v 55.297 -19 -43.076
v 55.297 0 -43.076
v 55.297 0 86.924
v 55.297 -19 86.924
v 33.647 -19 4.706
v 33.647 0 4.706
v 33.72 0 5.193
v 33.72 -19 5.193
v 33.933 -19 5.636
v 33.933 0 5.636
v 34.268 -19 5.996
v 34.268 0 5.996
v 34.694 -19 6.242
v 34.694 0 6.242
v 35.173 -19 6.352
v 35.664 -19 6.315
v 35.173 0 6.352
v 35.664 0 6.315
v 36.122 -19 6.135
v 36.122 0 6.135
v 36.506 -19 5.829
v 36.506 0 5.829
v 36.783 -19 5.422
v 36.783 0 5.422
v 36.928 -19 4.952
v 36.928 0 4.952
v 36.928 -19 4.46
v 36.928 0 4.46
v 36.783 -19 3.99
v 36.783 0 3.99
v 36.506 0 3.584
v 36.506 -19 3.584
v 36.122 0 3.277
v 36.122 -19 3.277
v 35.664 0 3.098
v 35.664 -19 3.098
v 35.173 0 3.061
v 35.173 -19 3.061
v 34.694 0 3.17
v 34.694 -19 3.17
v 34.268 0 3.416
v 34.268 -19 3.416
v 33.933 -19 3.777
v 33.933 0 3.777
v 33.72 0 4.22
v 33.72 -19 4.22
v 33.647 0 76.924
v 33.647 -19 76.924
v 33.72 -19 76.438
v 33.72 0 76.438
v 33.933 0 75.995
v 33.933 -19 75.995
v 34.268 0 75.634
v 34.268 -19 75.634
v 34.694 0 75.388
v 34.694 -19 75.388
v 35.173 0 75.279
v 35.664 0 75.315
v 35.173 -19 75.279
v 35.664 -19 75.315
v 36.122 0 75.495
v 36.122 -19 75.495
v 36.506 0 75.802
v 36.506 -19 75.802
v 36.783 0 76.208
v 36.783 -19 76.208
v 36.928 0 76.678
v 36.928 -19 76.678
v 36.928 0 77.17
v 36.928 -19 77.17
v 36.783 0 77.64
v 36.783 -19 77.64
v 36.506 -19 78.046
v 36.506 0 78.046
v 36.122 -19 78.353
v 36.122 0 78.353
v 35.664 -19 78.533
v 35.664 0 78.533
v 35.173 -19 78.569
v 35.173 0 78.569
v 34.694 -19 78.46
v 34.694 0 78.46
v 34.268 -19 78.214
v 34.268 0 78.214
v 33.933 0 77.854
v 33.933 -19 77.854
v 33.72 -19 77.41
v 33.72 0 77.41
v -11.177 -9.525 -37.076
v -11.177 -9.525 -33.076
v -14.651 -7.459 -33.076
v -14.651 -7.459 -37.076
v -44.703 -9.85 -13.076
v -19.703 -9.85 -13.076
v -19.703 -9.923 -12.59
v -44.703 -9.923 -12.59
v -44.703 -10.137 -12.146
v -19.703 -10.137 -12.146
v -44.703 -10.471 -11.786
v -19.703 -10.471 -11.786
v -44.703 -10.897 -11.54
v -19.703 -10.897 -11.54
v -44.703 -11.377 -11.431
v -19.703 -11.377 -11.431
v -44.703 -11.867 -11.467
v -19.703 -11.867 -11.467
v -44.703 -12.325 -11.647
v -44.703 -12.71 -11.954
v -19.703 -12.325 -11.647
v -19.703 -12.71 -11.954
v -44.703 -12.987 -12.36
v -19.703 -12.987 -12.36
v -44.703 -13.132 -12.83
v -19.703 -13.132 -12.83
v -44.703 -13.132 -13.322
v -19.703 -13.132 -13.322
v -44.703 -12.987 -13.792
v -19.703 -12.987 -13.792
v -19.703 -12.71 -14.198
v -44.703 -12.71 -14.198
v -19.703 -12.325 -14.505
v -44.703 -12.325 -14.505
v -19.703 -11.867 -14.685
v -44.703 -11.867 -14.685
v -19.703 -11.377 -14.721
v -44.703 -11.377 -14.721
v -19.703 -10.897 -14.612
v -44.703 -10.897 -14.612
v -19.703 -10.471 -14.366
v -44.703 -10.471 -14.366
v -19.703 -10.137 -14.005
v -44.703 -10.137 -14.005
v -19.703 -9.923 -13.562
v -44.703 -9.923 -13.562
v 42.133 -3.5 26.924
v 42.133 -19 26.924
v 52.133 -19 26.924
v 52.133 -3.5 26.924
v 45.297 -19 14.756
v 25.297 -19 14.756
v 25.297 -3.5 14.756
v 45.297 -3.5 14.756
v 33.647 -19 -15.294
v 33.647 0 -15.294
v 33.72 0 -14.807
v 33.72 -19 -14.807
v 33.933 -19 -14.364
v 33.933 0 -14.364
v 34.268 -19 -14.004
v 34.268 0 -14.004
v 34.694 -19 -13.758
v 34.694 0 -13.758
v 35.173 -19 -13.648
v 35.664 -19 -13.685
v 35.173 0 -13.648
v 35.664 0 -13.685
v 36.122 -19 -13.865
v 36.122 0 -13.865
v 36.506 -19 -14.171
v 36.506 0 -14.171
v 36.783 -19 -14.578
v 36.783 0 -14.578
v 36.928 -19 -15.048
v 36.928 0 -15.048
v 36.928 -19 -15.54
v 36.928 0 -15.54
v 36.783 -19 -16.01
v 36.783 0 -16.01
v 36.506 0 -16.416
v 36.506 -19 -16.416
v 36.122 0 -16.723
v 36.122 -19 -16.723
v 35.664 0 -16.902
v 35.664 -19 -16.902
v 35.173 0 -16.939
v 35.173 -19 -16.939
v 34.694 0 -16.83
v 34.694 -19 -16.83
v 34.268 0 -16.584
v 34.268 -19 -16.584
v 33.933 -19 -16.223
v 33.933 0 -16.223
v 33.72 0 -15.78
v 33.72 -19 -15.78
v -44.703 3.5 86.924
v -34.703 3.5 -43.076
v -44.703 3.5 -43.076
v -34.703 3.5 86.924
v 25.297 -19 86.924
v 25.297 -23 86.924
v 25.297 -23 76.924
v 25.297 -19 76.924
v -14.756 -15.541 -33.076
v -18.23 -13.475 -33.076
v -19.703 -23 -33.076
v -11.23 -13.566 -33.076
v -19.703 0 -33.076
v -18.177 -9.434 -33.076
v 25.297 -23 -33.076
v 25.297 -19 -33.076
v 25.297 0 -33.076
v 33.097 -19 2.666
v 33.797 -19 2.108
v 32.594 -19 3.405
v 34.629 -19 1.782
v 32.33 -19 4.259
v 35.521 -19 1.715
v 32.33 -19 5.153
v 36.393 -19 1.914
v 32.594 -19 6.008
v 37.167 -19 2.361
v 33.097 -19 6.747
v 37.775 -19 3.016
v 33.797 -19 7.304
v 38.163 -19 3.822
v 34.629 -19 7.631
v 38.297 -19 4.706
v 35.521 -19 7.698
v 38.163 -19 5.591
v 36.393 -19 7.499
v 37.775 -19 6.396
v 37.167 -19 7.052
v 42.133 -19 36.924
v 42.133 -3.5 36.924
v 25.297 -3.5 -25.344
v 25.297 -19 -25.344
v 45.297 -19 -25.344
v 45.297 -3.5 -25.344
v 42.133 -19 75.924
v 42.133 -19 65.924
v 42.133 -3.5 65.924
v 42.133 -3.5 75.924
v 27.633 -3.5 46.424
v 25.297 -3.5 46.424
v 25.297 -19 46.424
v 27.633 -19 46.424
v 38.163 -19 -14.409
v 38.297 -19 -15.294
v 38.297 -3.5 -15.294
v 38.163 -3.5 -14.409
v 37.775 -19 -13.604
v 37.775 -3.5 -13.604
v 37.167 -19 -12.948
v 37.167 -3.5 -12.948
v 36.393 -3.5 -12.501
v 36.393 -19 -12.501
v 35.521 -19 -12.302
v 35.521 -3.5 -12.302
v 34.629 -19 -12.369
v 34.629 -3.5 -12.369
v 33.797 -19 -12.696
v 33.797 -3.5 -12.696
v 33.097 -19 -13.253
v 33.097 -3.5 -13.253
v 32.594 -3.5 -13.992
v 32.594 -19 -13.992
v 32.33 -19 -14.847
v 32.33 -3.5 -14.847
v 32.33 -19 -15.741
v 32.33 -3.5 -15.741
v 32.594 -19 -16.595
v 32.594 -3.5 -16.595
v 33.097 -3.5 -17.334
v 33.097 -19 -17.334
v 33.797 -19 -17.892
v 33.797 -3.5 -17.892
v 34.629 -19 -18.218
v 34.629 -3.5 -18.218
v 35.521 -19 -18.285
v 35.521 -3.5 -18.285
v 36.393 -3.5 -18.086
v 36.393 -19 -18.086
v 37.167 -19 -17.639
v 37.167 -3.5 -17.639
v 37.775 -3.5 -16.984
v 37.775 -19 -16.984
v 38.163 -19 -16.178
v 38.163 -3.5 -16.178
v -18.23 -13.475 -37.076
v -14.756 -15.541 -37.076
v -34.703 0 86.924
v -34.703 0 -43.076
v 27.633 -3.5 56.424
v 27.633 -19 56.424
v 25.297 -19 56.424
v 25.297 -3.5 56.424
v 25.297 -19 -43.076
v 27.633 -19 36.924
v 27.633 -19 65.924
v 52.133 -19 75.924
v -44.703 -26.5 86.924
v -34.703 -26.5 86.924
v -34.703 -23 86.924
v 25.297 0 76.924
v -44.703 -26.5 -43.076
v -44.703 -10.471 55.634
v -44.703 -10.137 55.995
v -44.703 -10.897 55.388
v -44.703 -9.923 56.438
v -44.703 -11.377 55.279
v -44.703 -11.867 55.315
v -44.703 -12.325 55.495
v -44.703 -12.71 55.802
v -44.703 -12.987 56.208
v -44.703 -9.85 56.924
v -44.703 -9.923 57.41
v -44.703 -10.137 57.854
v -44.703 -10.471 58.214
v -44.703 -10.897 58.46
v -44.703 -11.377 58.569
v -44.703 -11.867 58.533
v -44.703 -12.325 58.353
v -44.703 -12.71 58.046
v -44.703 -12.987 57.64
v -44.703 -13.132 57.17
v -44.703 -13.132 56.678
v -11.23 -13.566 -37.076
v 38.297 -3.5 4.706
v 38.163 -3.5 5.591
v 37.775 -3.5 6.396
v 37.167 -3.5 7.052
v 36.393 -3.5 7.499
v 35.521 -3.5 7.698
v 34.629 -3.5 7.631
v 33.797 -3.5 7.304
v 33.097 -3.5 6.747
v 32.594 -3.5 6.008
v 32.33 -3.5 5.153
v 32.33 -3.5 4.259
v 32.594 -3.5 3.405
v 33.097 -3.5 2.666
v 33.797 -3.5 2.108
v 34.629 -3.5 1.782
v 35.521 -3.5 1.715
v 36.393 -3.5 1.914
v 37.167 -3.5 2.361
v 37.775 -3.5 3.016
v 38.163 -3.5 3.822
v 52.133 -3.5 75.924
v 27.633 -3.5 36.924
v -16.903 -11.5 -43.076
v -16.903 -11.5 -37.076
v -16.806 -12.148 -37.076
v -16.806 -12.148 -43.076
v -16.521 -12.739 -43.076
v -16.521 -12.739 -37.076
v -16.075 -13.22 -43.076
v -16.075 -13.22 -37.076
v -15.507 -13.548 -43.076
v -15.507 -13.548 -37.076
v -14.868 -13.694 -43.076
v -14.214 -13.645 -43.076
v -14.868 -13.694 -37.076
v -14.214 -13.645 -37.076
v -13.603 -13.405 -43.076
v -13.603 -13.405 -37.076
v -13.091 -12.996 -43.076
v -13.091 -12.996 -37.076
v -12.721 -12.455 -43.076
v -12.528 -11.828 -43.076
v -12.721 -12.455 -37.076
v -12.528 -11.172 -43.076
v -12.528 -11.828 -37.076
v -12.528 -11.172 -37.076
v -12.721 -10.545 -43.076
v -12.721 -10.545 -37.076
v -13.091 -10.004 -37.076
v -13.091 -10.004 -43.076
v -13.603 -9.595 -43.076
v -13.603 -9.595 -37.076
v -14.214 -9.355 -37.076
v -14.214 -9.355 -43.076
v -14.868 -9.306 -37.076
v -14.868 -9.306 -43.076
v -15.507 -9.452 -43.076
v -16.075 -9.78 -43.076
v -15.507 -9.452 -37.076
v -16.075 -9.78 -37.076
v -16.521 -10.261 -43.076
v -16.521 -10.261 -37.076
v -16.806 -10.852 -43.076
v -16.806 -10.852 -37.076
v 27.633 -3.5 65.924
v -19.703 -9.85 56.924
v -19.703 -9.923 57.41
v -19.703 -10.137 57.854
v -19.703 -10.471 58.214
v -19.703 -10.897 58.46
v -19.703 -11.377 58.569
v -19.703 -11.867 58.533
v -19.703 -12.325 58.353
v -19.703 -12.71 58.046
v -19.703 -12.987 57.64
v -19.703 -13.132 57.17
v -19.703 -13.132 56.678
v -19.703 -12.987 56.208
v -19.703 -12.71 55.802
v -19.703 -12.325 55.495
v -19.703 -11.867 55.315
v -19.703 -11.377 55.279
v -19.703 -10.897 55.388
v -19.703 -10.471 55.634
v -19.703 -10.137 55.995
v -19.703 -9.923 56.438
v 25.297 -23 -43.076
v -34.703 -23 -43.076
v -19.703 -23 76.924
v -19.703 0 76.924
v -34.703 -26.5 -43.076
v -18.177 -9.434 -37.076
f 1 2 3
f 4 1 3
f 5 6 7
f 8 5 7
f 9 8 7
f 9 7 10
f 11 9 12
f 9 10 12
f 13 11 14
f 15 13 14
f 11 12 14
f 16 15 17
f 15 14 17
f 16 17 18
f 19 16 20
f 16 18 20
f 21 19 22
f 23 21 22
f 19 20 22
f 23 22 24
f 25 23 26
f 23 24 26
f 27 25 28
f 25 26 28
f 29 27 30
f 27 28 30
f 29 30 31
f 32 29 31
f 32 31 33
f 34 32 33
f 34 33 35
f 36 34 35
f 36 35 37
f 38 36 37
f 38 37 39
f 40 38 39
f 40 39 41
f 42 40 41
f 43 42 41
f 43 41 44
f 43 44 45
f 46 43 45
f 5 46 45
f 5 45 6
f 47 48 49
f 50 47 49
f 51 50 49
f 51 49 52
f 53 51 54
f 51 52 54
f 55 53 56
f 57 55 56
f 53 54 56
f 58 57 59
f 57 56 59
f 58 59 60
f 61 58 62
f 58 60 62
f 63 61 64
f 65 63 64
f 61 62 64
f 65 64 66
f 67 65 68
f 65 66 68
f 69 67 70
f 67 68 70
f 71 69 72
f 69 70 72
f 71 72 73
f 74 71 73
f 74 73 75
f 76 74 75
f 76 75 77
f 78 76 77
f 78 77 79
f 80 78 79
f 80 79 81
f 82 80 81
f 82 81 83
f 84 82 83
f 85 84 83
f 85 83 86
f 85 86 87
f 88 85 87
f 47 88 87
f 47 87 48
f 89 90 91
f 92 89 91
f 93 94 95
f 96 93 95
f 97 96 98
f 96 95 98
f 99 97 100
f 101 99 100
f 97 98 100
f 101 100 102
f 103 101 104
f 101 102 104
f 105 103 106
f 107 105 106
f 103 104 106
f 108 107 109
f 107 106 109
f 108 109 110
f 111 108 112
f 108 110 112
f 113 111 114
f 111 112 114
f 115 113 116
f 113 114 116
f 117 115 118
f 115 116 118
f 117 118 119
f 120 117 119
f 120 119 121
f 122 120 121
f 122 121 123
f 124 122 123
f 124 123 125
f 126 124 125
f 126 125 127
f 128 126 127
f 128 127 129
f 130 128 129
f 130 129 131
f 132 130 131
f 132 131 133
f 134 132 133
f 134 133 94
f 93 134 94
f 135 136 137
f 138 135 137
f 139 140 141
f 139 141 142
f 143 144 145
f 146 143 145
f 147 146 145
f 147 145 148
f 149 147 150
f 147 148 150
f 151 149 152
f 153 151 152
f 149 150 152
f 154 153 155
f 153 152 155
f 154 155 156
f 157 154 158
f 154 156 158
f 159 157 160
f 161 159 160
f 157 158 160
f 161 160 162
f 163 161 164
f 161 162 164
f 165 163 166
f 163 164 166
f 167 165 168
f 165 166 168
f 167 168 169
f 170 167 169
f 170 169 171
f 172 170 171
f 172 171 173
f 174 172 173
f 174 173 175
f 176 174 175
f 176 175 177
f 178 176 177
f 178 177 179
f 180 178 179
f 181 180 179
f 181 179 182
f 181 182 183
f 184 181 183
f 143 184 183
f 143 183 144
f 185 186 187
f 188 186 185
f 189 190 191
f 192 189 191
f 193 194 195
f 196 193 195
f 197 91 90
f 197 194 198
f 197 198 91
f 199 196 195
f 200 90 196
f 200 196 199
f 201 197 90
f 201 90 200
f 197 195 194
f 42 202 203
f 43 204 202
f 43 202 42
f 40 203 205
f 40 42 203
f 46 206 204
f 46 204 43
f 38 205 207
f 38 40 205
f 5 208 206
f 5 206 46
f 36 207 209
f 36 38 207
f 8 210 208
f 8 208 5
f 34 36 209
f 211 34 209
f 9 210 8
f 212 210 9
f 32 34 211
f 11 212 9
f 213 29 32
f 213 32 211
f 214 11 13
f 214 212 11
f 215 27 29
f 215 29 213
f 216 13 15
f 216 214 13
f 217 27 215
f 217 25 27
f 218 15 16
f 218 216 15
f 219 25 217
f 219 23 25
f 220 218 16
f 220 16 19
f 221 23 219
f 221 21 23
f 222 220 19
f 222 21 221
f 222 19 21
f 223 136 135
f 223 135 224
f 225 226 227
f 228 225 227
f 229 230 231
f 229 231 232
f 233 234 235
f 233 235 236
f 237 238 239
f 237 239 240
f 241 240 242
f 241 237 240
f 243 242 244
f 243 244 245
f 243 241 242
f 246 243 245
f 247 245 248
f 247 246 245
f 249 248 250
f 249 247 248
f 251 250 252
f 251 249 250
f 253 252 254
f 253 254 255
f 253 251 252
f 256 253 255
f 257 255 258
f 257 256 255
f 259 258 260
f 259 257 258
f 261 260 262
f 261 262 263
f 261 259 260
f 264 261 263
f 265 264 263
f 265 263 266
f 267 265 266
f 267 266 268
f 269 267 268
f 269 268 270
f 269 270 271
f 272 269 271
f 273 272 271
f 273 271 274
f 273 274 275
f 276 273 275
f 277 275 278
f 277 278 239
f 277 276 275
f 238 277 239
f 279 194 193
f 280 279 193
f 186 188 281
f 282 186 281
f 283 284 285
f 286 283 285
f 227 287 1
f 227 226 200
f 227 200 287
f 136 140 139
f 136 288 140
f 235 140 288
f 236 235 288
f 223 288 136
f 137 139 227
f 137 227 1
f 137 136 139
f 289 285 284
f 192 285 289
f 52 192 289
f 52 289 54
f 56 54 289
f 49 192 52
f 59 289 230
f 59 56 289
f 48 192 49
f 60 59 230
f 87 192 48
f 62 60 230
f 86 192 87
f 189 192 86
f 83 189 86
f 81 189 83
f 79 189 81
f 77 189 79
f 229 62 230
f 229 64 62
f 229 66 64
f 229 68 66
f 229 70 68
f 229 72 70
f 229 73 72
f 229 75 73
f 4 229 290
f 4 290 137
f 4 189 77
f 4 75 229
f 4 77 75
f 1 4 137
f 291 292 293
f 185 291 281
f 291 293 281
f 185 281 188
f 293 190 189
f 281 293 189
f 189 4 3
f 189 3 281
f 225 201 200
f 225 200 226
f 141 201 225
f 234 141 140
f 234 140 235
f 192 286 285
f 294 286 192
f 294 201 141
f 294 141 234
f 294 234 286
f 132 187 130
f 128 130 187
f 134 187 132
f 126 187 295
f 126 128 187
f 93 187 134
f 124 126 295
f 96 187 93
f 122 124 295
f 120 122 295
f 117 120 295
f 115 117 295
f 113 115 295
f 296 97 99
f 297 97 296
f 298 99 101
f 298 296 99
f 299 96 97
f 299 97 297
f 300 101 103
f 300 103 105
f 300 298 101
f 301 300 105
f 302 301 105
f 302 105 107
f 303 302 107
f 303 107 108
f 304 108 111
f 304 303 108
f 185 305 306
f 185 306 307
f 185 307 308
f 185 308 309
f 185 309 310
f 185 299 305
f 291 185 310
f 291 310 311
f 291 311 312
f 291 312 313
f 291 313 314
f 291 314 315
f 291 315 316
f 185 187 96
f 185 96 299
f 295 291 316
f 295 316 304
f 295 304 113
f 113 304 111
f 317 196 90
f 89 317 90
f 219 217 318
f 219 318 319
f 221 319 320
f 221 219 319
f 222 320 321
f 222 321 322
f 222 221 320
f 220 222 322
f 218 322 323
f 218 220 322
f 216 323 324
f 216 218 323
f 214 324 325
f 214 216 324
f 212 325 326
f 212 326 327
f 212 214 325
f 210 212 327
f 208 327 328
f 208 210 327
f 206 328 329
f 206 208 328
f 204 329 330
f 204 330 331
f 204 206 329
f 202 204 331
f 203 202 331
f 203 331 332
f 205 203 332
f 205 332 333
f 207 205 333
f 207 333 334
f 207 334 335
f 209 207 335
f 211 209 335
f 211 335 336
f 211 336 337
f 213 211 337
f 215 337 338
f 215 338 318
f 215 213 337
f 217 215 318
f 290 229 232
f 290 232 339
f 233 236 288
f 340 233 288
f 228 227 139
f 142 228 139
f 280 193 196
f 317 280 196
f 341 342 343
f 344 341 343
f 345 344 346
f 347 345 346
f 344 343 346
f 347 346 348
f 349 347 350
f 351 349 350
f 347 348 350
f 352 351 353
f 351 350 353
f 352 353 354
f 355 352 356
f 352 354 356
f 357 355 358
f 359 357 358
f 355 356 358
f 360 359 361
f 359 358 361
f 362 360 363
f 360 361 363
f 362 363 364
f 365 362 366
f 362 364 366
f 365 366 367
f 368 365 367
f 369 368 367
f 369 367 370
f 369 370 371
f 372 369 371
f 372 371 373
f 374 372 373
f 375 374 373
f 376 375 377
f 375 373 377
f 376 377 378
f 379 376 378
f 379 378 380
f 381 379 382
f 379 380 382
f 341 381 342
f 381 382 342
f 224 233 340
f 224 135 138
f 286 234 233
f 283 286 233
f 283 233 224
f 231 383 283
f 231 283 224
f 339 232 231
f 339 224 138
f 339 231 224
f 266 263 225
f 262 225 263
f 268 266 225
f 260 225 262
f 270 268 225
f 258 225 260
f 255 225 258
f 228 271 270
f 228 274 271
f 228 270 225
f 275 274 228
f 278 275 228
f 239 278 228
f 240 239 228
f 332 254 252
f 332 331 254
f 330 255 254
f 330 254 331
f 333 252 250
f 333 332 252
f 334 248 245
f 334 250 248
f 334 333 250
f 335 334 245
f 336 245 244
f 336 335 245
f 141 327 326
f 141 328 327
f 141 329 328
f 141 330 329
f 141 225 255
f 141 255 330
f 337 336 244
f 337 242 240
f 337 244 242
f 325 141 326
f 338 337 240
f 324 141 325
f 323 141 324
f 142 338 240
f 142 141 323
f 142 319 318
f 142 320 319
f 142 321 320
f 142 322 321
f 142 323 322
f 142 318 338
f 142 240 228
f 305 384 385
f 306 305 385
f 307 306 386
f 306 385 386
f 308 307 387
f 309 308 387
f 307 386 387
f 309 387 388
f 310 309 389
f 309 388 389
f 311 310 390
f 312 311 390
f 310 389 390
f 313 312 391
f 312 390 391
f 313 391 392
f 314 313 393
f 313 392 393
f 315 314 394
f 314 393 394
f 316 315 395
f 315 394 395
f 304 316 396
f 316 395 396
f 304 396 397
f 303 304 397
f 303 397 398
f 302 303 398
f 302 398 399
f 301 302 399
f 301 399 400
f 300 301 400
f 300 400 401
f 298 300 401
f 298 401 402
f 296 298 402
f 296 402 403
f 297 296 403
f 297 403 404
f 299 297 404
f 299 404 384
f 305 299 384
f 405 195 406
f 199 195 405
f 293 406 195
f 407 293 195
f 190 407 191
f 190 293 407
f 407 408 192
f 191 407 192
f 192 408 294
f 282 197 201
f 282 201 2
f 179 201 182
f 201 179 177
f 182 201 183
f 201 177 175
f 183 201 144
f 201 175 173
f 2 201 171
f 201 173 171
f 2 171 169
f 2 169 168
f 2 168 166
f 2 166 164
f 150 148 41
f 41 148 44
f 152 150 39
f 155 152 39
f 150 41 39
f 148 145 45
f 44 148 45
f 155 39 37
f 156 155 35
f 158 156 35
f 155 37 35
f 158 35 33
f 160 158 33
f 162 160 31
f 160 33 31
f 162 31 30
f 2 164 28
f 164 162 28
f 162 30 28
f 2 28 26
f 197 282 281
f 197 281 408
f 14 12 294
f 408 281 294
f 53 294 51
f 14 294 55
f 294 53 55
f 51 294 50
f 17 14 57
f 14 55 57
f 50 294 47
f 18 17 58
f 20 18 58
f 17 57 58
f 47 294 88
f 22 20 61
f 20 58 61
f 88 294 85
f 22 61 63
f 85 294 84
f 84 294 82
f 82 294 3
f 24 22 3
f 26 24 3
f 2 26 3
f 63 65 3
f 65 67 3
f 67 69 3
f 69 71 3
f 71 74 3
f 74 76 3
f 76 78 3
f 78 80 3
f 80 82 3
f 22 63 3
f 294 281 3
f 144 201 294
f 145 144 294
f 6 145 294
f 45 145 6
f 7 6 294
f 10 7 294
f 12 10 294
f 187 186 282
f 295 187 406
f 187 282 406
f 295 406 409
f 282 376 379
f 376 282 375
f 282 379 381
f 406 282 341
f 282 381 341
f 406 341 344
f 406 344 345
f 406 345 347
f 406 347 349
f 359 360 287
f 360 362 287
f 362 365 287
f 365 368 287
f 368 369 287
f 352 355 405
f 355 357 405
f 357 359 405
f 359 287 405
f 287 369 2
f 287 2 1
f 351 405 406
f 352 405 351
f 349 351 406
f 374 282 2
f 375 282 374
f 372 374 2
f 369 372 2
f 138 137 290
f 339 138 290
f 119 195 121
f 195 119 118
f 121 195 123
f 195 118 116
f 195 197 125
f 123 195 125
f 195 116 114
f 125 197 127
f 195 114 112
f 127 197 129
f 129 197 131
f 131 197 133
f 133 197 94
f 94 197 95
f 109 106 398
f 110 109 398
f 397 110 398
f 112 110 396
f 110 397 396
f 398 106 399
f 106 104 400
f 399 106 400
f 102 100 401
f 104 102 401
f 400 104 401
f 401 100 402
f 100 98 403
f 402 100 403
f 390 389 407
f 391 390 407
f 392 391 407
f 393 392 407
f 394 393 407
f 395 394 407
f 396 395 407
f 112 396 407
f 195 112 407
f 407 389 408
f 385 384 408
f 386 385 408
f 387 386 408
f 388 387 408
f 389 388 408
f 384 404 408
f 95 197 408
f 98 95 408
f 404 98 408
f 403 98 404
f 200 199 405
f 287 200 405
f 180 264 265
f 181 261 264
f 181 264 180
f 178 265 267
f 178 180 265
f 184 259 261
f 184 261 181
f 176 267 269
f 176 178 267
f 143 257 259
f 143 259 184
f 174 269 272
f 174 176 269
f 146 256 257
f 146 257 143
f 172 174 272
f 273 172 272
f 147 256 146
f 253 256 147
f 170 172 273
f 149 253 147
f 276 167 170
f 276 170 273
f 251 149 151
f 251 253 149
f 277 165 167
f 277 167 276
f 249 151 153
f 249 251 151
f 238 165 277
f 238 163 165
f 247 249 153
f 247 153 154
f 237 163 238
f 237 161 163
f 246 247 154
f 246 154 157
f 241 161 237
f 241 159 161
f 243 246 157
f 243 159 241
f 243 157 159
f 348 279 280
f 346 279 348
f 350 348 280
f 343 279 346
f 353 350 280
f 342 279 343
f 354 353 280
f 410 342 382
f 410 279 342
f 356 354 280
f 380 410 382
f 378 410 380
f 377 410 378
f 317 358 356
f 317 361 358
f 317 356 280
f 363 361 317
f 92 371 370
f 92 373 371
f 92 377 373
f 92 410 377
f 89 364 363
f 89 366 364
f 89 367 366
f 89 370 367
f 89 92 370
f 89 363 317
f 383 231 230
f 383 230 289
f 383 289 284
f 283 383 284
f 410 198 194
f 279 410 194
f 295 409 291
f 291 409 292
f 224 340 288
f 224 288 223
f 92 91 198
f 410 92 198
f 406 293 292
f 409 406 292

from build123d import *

# Parameters (mm, degrees)
F0_W      = 90
F0_H      = 130
F0_W_2    = 45
F0_H_2    = 110
F1_DEPTH  = 23
F2_W      = 3.5
F2_H      = 130
F2_W_2    = 23
F3_DEPTH  = 10
F5_DEPTH  = 4
F6_W      = 5.5
F6_H      = 10
F6_W_2    = 3.1640307605
F6_W_3    = 2.3359692395
F6_W_4    = 10
F6_W_5    = 20
F6_H_2    = 40.1
F6_R      = 3
F7_DEPTH  = 15.5
F9_D      = 3.3
F9_DEPTH  = 40
F9_TIP    = 0.9914200214
F10_D     = 3.3
F10_DEPTH = 40
F10_TIP   = 0.9914200214
F12_D     = 3.3
F12_DEPTH = 40
F12_TIP   = 0.9914200214
F14_D     = 4.4
F14_DEPTH = 10
F14_TIP   = 1.3218933619
F15_R     = 2.2
F16_DEPTH = 4


with BuildPart() as f1:
    # F0 (on Front) → F1 (new body)
    with BuildSketch(Plane.XZ):
        with Locations((10.2966074646, 21.924110651)):
            Rectangle(F0_W, F0_H)
        with Locations((2.7966074646, 21.924110651)):
            Rectangle(F0_W_2, F0_H_2, mode=Mode.SUBTRACT)
    extrude(amount=F1_DEPTH)

    # F2 (on face) → F3 (join)
    with BuildSketch(Plane(origin=(-34.7033925354, 0, 0), x_dir=(0, -1, 0), z_dir=(-1, 0, 0))):
        with Locations((-1.75, 21.924110651)):
            Rectangle(F2_W, F2_H)
        with Locations((11.5, 21.924110651)):
            Rectangle(F2_W_2, F2_H)
        with Locations((24.75, 21.924110651)):
            Rectangle(F2_W, F2_H)
    extrude(amount=F3_DEPTH)

    # F4 (on face) → F5 (cut)
    with BuildSketch(Plane.XZ.offset(23)):
        Polygon((55.2966074646, -43.075889349), (55.2966074646, 86.924110651), (25.2966074646, 86.924110651), (25.2966074646, 76.924110651), (25.2966074646, -33.075889349), (25.2966074646, -43.075889349), align=None)
    extrude(amount=-F5_DEPTH, mode=Mode.SUBTRACT)

    # F6 (on face) → F7 (cut)
    with BuildSketch(Plane.XZ.offset(19)):
        Polygon((42.132576704, 65.924110651), (27.632576704, 65.924110651), (27.632576704, 56.424110651), (33.132576704, 56.424110651), (33.132576704, 46.424110651), (27.632576704, 46.424110651), (27.632576704, 36.924110651), (42.132576704, 36.924110651), (52.132576704, 36.924110651), (52.132576704, 65.924110651), align=None)
        with Locations((30.382576704, 51.424110651)):
            Rectangle(F6_W, F6_H)
        with Locations((23.7145920843, 51.424110651)):
            Rectangle(F6_W_2, F6_H)
        with Locations((26.4645920843, 51.424110651)):
            Rectangle(F6_W_3, F6_H)
        with Locations((47.132576704, 70.924110651)):
            Rectangle(F6_W_4, F6_H)
        with Locations((47.132576704, 31.924110651)):
            Rectangle(F6_W_4, F6_H)
        with Locations((35.2966074646, -5.2936900675)):
            Rectangle(F6_W_5, F6_H_2)
        with Locations((35.2966074646, -15.2936900675)):
            Circle(F6_R, mode=Mode.SUBTRACT)
        with Locations((35.2966074646, 4.7063099325)):
            Circle(F6_R, mode=Mode.SUBTRACT)
    extrude(amount=-F7_DEPTH, mode=Mode.SUBTRACT)

    # F9
    with Locations(Plane.XZ.offset(19)):
        with Locations((35.2966074646, 4.7063099325), (35.2966074646, -15.2936900675)):
            Hole(F9_D / 2, depth=F9_DEPTH)
            with Locations((0, 0, -(F9_DEPTH + F9_TIP / 2))):  # 118° drill point
                Cone(0, F9_D / 2, F9_TIP, mode=Mode.SUBTRACT)

    # F10
    with Locations(Plane(origin=(0, 0, 0), x_dir=(1, 0, 0), z_dir=(0, 1, 0))):
        with Locations((35.2966074646, -76.924110651)):
            Hole(F10_D / 2, depth=F10_DEPTH)
            with Locations((0, 0, -(F10_DEPTH + F10_TIP / 2))):  # 118° drill point
                Cone(0, F10_D / 2, F10_TIP, mode=Mode.SUBTRACT)

    # F12 (one way)
    with BuildSketch(Plane.YZ.offset(-19.7033925354)):
        with Locations((-11.5, 56.924110651), (-11.5, -13.075889349)):
            Circle(F12_D / 2)
    extrude(amount=-F12_DEPTH, mode=Mode.SUBTRACT)
    with Locations(Plane.YZ.offset(-19.7033925354)):
        with Locations((-11.5, 56.924110651), (-11.5, -13.075889349)):
            with Locations((0, 0, -(F12_DEPTH + F12_TIP / 2))):  # 118° drill point
                Cone(0, F12_D / 2, F12_TIP, mode=Mode.SUBTRACT)

    # F14
    with Locations(Plane(origin=(0, 0, -43.075889349), x_dir=(1, 0, 0), z_dir=(0, 0, -1))):
        with Locations((-14.7033925354, 11.5)):
            Hole(F14_D / 2, depth=F14_DEPTH)
            with Locations((0, 0, -(F14_DEPTH + F14_TIP / 2))):  # 118° drill point
                Cone(0, F14_D / 2, F14_TIP, mode=Mode.SUBTRACT)

    # F15 (on face) → F16 (cut)
    with BuildSketch(Plane.XY.offset(-33.075889349)):
        Polygon((-11.1772465223, -9.524560281), (-14.6511005092, -7.4585481157), (-18.1772465223, -9.4339878346), (-18.2295385486, -13.475439719), (-14.7556845617, -15.5414518843), (-11.2295385486, -13.5660121654), align=None)
        with Locations((-14.7033925354, -11.5)):
            Circle(F15_R, mode=Mode.SUBTRACT)
    extrude(amount=-F16_DEPTH, mode=Mode.SUBTRACT)


solid = f1.part
